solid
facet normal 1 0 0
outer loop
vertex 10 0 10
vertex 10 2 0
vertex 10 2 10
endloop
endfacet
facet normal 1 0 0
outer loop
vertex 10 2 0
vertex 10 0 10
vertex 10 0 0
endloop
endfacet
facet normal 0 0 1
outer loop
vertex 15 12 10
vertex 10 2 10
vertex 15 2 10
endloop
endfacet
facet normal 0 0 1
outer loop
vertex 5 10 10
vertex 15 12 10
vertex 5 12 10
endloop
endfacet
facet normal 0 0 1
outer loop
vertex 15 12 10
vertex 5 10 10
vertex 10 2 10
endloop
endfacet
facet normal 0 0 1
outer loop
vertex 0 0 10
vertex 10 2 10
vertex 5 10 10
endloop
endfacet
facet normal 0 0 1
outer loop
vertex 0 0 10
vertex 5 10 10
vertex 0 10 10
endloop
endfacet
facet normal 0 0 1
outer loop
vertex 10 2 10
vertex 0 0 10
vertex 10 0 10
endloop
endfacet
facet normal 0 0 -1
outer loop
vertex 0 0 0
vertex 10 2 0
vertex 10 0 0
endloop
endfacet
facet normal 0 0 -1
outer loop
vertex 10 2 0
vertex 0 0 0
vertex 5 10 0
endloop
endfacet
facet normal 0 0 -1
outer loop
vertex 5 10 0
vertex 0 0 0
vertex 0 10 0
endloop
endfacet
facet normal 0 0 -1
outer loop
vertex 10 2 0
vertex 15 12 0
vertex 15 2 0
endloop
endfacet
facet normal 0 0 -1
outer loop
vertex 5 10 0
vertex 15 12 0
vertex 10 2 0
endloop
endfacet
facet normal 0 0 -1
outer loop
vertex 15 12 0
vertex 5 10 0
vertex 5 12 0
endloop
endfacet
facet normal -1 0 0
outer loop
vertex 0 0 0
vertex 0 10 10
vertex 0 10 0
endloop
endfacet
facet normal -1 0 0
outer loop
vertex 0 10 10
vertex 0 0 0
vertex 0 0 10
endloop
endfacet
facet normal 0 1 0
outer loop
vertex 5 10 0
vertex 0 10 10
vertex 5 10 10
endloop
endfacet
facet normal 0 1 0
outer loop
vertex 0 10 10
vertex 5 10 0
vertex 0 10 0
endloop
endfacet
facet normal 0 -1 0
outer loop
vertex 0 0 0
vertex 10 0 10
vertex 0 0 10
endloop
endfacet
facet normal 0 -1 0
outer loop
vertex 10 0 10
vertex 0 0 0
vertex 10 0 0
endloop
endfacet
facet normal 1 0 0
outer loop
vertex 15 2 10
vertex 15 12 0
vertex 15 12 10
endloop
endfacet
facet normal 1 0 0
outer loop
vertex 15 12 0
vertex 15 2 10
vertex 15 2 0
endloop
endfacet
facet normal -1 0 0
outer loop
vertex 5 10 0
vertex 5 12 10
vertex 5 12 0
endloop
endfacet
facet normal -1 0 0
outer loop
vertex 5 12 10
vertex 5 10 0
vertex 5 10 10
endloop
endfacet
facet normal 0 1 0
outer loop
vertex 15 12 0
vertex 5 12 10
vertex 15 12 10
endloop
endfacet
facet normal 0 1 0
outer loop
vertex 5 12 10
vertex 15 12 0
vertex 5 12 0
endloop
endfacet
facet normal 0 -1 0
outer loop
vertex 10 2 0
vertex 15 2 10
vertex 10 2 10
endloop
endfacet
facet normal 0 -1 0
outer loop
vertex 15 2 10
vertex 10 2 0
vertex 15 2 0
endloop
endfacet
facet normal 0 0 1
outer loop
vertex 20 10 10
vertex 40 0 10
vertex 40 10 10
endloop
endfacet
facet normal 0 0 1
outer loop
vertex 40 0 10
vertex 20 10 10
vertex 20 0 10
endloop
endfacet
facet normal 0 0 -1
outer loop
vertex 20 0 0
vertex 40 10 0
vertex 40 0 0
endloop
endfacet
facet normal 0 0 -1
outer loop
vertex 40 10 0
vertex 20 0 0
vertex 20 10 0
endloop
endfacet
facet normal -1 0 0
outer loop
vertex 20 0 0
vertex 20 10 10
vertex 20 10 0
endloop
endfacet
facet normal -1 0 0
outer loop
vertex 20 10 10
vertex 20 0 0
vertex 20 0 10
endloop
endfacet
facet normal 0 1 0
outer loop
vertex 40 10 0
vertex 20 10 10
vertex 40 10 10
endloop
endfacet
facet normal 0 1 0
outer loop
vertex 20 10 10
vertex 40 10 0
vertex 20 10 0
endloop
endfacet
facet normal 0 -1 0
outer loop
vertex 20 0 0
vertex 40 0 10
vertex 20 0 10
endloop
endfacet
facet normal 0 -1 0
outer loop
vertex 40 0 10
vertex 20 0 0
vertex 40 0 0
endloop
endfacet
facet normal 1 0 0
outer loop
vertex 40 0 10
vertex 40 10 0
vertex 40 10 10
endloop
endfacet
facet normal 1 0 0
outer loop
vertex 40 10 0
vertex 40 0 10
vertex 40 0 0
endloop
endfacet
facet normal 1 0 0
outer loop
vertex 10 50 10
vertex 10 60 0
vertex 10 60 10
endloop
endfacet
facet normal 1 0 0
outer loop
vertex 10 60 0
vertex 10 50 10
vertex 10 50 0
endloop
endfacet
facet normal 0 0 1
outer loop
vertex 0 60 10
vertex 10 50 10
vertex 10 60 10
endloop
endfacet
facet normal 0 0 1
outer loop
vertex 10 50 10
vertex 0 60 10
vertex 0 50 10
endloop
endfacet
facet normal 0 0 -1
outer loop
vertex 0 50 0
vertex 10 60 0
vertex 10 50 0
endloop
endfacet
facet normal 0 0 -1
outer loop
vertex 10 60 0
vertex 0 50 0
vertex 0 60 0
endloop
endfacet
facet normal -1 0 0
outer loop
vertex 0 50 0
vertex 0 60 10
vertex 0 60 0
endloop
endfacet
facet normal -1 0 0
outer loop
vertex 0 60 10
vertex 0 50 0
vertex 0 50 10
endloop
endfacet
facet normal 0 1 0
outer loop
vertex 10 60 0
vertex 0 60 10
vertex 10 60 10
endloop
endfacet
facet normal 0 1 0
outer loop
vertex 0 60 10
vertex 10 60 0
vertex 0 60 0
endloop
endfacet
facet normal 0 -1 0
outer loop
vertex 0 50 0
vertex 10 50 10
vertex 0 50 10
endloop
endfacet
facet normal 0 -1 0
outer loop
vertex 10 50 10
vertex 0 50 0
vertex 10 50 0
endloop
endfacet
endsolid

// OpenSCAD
// Two overlapping cubes, a flush pair, and a far-away part.
// Expect one collision (parts 1 and 2, volume 400) with both cubes attributed.
cube(10);                       // part 1
translate([5, 2, 0]) cube(10);  // part 2: overlaps part 1 (overlap volume 400)
translate([20, 0, 0]) cube(10); // part 3: shares a flush face with part 4
translate([30, 0, 0]) cube(10); // part 4: flush with part 3 (overlap volume 0)
translate([0, 50, 0]) cube(10); // part 5: far away, bounding-box culled
